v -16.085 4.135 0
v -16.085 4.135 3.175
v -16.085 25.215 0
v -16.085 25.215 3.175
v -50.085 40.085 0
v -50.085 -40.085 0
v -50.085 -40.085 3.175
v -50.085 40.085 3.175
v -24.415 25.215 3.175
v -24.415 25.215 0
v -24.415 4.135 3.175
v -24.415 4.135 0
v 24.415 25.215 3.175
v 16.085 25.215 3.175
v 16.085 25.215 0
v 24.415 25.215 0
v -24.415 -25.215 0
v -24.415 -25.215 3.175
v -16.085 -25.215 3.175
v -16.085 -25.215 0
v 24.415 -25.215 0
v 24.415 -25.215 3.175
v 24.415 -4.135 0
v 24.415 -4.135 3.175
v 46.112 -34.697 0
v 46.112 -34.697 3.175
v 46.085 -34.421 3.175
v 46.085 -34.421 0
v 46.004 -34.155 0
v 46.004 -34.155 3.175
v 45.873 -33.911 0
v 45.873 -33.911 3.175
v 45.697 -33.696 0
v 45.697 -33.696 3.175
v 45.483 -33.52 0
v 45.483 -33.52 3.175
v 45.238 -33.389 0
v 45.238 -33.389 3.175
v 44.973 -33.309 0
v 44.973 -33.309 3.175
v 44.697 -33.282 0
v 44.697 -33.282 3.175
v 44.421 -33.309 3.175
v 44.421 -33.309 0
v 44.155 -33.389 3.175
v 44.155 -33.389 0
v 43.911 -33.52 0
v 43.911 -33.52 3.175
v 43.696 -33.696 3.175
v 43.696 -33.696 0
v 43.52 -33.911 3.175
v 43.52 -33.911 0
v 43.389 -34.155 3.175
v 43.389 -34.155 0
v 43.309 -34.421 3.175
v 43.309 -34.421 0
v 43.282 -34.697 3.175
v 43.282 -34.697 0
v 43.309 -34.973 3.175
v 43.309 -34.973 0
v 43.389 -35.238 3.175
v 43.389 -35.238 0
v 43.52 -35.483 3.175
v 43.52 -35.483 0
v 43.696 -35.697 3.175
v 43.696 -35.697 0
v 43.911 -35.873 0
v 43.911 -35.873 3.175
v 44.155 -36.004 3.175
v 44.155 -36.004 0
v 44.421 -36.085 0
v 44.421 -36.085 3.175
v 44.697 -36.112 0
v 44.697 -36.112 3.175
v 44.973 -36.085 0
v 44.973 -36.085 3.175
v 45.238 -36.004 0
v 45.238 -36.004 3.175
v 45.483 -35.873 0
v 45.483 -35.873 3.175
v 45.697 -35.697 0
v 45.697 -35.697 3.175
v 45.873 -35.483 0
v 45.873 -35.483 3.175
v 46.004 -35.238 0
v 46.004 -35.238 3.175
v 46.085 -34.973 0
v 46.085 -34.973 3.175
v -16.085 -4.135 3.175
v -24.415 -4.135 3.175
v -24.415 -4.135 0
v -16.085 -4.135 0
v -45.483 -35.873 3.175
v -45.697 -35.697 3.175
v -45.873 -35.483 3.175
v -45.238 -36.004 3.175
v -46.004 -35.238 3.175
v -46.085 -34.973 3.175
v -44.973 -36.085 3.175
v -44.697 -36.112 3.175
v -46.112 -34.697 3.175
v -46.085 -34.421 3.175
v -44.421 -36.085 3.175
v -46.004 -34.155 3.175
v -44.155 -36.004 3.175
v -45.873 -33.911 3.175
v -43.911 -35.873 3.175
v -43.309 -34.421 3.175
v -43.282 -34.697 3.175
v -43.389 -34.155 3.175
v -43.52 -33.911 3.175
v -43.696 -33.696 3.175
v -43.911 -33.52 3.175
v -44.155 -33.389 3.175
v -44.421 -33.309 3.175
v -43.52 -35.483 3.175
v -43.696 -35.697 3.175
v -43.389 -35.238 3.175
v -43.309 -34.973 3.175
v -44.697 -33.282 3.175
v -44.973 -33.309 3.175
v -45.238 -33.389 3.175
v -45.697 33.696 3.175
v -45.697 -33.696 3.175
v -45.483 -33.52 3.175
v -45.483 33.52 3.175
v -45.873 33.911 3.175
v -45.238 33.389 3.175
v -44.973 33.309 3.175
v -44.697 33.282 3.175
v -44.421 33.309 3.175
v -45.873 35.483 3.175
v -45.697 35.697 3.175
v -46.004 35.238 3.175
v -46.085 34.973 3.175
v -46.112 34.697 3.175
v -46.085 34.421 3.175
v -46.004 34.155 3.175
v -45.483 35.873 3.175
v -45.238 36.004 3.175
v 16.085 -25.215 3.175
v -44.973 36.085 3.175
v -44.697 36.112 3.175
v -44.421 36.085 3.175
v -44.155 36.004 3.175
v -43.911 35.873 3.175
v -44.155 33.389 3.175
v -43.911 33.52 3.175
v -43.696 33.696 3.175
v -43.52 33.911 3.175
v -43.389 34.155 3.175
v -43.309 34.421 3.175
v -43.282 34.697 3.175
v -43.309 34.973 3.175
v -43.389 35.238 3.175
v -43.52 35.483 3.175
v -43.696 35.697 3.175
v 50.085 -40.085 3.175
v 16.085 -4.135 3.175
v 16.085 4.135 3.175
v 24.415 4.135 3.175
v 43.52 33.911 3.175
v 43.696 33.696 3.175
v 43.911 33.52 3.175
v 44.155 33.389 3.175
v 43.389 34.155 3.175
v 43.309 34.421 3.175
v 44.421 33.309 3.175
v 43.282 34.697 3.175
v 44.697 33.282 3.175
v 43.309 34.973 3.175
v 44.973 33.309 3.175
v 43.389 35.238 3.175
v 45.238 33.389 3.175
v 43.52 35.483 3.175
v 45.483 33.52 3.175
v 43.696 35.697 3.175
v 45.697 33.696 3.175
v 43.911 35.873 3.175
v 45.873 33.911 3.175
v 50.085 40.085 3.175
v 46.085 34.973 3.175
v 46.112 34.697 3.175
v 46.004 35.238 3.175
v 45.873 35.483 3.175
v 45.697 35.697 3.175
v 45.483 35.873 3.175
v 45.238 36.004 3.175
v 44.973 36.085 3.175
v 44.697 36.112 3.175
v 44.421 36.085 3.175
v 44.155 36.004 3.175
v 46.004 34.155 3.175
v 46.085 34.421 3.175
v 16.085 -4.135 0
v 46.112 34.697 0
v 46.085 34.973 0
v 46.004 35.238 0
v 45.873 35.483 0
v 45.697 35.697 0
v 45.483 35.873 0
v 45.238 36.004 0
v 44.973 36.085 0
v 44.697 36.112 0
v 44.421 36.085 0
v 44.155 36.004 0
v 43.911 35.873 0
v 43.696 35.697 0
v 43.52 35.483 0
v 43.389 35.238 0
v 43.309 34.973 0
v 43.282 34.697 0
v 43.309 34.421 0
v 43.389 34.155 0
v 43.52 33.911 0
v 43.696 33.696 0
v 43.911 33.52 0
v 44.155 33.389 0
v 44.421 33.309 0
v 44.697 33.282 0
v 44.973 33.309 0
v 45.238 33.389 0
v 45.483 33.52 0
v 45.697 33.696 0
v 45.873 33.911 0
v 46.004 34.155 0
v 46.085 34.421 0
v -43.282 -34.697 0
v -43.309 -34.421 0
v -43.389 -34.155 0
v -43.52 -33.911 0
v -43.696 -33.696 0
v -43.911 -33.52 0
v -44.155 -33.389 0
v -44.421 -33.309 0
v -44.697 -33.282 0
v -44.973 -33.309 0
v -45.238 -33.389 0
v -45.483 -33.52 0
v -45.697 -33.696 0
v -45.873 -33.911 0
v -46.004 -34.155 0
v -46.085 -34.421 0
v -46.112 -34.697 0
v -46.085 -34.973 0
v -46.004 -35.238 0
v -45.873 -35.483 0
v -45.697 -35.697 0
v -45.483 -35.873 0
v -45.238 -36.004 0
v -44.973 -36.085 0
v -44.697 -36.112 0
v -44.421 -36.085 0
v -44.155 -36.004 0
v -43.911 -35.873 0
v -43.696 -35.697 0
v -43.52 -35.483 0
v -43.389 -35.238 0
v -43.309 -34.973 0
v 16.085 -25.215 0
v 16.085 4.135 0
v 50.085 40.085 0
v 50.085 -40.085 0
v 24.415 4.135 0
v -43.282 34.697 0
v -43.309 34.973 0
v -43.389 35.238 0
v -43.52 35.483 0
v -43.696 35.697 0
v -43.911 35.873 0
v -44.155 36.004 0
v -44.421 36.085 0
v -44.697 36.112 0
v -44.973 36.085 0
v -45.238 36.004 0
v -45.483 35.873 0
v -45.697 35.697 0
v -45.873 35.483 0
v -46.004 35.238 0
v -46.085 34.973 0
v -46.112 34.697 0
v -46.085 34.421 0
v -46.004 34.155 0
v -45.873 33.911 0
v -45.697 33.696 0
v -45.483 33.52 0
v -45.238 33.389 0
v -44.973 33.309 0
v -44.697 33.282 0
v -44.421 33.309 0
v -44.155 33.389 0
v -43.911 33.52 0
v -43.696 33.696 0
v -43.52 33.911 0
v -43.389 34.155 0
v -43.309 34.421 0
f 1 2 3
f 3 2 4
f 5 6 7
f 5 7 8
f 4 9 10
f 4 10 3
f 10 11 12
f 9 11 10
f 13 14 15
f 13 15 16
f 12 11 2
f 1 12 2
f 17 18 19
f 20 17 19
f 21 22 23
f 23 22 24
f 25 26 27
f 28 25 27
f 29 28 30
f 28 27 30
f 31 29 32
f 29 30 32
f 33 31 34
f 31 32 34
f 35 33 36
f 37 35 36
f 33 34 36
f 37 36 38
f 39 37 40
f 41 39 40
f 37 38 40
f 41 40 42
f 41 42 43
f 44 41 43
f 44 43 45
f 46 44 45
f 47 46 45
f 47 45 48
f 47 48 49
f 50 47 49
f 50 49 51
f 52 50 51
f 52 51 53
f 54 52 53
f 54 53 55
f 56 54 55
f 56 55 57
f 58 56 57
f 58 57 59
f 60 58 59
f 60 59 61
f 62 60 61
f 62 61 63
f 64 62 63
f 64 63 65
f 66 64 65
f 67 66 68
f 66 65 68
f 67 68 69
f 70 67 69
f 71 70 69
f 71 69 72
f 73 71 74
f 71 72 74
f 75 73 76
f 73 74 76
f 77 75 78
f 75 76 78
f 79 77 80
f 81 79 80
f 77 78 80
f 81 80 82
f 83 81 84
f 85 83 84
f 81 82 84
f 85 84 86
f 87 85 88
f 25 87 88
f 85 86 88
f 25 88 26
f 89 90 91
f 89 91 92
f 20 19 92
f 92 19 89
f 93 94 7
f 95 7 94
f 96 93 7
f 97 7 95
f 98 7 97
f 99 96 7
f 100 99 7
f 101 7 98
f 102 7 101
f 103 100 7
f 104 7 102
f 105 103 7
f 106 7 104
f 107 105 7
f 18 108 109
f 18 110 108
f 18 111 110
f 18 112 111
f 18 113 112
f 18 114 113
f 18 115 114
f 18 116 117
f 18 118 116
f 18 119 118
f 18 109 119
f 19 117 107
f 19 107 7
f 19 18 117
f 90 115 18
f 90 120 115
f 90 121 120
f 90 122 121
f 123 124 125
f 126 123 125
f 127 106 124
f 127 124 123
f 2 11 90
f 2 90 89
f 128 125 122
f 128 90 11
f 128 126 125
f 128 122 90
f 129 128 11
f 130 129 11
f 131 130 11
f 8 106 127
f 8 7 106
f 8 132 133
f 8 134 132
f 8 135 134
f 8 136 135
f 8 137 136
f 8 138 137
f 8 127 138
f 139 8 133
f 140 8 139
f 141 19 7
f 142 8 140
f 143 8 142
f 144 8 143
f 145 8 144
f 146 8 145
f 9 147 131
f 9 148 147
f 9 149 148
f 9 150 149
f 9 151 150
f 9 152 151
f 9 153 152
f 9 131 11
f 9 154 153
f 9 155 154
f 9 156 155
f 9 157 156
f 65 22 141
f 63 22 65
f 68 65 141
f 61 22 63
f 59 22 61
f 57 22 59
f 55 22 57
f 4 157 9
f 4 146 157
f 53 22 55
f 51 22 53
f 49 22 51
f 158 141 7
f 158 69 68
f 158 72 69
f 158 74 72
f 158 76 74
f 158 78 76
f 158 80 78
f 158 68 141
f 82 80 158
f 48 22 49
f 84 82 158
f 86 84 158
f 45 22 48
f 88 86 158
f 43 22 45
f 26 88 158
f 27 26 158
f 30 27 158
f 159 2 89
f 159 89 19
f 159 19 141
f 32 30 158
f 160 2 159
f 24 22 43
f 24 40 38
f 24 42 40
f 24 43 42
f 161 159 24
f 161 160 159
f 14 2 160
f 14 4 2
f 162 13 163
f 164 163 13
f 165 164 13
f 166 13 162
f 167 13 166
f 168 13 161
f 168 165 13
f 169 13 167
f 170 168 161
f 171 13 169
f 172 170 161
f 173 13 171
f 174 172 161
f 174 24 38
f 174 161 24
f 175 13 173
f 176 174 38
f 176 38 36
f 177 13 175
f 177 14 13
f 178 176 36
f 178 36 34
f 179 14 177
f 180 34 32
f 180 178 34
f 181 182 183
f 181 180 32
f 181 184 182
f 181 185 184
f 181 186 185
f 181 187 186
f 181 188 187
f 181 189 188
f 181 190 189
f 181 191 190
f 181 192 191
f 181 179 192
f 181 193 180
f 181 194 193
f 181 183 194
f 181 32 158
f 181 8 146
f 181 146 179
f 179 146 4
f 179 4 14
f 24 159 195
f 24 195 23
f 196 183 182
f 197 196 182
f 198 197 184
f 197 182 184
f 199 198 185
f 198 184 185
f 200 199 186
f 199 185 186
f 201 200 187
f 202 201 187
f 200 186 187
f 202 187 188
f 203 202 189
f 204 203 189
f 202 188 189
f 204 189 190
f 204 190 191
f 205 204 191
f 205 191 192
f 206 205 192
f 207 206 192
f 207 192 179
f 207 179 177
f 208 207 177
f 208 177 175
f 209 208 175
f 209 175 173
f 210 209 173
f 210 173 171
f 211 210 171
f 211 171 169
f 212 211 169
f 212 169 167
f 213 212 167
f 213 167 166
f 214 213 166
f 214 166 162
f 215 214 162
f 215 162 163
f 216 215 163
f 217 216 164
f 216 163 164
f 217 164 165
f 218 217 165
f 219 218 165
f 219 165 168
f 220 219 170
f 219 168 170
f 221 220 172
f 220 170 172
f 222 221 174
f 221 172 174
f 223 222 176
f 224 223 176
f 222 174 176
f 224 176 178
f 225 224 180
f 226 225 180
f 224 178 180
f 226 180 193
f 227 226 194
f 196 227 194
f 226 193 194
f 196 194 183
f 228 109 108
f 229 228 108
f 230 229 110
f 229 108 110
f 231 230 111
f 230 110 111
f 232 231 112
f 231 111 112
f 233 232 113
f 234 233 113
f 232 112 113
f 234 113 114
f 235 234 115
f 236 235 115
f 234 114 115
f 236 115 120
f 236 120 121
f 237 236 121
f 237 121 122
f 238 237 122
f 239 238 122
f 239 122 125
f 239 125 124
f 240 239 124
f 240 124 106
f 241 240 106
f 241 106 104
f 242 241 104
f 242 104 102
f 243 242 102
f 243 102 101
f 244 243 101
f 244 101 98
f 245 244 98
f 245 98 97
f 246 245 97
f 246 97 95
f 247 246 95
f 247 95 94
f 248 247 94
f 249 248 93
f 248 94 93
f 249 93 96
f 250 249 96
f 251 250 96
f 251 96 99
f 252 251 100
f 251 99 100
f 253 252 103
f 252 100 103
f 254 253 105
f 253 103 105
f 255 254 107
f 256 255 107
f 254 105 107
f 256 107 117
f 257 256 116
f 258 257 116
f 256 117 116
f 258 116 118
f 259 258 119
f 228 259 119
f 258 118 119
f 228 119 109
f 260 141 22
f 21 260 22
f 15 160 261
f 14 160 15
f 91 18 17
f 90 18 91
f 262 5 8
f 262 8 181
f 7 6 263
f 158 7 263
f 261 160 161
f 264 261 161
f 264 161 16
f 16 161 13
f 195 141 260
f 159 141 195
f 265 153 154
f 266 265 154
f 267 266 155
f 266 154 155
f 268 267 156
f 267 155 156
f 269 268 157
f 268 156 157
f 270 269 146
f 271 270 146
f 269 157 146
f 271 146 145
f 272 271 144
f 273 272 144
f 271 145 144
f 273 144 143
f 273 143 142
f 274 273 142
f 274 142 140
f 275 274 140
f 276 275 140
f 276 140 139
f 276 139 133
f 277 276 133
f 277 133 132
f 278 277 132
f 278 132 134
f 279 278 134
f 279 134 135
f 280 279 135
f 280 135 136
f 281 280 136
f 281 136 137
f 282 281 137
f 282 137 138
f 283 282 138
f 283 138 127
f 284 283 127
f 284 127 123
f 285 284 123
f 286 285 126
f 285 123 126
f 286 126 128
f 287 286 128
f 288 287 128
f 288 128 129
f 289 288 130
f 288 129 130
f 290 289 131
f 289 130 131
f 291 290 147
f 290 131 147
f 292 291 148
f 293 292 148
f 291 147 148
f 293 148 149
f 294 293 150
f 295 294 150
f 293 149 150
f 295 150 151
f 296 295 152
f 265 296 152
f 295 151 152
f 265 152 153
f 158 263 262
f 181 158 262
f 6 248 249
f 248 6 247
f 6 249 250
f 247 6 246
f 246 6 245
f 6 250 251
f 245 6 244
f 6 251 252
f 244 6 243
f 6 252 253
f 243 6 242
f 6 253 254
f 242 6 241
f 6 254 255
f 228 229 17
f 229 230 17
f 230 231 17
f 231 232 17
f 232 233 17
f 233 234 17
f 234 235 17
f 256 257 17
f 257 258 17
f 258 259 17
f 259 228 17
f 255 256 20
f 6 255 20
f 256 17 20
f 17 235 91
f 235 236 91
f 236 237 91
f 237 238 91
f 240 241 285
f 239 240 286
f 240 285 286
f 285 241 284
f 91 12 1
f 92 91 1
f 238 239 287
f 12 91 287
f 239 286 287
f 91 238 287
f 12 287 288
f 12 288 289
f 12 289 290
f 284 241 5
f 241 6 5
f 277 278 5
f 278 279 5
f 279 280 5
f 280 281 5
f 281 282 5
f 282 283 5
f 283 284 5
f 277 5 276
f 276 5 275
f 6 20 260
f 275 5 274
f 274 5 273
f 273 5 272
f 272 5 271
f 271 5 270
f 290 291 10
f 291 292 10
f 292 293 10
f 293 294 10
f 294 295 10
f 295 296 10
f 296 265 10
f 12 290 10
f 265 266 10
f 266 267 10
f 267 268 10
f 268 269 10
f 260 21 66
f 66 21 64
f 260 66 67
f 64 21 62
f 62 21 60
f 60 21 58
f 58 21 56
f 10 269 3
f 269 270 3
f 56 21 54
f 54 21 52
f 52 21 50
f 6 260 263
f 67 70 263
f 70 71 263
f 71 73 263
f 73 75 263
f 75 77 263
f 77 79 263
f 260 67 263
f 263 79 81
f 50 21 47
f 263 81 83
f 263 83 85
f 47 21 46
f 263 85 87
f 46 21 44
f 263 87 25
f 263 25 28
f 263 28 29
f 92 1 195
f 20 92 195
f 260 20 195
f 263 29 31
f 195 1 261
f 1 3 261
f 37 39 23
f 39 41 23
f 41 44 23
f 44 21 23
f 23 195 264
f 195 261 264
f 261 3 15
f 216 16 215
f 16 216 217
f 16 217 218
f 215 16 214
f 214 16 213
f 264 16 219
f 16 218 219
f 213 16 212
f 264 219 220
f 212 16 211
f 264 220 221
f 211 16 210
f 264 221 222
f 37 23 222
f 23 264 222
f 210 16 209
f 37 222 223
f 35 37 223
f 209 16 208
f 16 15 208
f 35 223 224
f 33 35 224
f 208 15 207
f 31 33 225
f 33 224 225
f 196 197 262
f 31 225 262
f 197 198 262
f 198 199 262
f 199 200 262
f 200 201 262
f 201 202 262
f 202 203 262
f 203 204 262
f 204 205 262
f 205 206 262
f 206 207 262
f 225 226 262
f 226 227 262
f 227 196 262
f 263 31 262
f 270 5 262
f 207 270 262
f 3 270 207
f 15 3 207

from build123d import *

# Parameters (mm, degrees)
SKETCH1_W           = 100.17
SKETCH1_H           = 80.17
BOSS_EXTRUDE1_DEPTH = 3.175
SKETCH3_R           = 1.415
CUT_EXTRUDE2_DEPTH  = 4.175
SKETCH2_W           = 8.33
SKETCH2_H           = 21.08
CUT_EXTRUDE3_DEPTH  = 10


with BuildPart() as part:
    # Sketch1 → Boss-Extrude1 (new body)
    with BuildSketch(Plane.XY):
        Rectangle(SKETCH1_W, SKETCH1_H)
    extrude(amount=BOSS_EXTRUDE1_DEPTH)

    # Sketch3 → Cut-Extrude2 (cut, through all)
    with BuildSketch(Plane.XY.offset(3.175)):
        with Locations((-44.696699141, 34.696699141)):
            Circle(SKETCH3_R)
        with Locations((44.696699141, 34.696699141)):
            Circle(SKETCH3_R)
        with Locations((44.696699141, -34.696699141)):
            Circle(SKETCH3_R)
        with Locations((-44.696699141, -34.696699141)):
            Circle(SKETCH3_R)
    extrude(amount=-CUT_EXTRUDE2_DEPTH, mode=Mode.SUBTRACT)

    # Sketch2 → Cut-Extrude3 (cut)
    with BuildSketch(Plane.XY.offset(3.175)):
        with Locations((-20.25, 14.675)):
            Rectangle(SKETCH2_W, SKETCH2_H)
        with Locations((20.25, 14.675)):
            Rectangle(SKETCH2_W, SKETCH2_H)
        with Locations((-20.25, -14.675)):
            Rectangle(SKETCH2_W, SKETCH2_H)
        with Locations((20.25, -14.675)):
            Rectangle(SKETCH2_W, SKETCH2_H)
    extrude(amount=-CUT_EXTRUDE3_DEPTH, mode=Mode.SUBTRACT)


solid = part.part
